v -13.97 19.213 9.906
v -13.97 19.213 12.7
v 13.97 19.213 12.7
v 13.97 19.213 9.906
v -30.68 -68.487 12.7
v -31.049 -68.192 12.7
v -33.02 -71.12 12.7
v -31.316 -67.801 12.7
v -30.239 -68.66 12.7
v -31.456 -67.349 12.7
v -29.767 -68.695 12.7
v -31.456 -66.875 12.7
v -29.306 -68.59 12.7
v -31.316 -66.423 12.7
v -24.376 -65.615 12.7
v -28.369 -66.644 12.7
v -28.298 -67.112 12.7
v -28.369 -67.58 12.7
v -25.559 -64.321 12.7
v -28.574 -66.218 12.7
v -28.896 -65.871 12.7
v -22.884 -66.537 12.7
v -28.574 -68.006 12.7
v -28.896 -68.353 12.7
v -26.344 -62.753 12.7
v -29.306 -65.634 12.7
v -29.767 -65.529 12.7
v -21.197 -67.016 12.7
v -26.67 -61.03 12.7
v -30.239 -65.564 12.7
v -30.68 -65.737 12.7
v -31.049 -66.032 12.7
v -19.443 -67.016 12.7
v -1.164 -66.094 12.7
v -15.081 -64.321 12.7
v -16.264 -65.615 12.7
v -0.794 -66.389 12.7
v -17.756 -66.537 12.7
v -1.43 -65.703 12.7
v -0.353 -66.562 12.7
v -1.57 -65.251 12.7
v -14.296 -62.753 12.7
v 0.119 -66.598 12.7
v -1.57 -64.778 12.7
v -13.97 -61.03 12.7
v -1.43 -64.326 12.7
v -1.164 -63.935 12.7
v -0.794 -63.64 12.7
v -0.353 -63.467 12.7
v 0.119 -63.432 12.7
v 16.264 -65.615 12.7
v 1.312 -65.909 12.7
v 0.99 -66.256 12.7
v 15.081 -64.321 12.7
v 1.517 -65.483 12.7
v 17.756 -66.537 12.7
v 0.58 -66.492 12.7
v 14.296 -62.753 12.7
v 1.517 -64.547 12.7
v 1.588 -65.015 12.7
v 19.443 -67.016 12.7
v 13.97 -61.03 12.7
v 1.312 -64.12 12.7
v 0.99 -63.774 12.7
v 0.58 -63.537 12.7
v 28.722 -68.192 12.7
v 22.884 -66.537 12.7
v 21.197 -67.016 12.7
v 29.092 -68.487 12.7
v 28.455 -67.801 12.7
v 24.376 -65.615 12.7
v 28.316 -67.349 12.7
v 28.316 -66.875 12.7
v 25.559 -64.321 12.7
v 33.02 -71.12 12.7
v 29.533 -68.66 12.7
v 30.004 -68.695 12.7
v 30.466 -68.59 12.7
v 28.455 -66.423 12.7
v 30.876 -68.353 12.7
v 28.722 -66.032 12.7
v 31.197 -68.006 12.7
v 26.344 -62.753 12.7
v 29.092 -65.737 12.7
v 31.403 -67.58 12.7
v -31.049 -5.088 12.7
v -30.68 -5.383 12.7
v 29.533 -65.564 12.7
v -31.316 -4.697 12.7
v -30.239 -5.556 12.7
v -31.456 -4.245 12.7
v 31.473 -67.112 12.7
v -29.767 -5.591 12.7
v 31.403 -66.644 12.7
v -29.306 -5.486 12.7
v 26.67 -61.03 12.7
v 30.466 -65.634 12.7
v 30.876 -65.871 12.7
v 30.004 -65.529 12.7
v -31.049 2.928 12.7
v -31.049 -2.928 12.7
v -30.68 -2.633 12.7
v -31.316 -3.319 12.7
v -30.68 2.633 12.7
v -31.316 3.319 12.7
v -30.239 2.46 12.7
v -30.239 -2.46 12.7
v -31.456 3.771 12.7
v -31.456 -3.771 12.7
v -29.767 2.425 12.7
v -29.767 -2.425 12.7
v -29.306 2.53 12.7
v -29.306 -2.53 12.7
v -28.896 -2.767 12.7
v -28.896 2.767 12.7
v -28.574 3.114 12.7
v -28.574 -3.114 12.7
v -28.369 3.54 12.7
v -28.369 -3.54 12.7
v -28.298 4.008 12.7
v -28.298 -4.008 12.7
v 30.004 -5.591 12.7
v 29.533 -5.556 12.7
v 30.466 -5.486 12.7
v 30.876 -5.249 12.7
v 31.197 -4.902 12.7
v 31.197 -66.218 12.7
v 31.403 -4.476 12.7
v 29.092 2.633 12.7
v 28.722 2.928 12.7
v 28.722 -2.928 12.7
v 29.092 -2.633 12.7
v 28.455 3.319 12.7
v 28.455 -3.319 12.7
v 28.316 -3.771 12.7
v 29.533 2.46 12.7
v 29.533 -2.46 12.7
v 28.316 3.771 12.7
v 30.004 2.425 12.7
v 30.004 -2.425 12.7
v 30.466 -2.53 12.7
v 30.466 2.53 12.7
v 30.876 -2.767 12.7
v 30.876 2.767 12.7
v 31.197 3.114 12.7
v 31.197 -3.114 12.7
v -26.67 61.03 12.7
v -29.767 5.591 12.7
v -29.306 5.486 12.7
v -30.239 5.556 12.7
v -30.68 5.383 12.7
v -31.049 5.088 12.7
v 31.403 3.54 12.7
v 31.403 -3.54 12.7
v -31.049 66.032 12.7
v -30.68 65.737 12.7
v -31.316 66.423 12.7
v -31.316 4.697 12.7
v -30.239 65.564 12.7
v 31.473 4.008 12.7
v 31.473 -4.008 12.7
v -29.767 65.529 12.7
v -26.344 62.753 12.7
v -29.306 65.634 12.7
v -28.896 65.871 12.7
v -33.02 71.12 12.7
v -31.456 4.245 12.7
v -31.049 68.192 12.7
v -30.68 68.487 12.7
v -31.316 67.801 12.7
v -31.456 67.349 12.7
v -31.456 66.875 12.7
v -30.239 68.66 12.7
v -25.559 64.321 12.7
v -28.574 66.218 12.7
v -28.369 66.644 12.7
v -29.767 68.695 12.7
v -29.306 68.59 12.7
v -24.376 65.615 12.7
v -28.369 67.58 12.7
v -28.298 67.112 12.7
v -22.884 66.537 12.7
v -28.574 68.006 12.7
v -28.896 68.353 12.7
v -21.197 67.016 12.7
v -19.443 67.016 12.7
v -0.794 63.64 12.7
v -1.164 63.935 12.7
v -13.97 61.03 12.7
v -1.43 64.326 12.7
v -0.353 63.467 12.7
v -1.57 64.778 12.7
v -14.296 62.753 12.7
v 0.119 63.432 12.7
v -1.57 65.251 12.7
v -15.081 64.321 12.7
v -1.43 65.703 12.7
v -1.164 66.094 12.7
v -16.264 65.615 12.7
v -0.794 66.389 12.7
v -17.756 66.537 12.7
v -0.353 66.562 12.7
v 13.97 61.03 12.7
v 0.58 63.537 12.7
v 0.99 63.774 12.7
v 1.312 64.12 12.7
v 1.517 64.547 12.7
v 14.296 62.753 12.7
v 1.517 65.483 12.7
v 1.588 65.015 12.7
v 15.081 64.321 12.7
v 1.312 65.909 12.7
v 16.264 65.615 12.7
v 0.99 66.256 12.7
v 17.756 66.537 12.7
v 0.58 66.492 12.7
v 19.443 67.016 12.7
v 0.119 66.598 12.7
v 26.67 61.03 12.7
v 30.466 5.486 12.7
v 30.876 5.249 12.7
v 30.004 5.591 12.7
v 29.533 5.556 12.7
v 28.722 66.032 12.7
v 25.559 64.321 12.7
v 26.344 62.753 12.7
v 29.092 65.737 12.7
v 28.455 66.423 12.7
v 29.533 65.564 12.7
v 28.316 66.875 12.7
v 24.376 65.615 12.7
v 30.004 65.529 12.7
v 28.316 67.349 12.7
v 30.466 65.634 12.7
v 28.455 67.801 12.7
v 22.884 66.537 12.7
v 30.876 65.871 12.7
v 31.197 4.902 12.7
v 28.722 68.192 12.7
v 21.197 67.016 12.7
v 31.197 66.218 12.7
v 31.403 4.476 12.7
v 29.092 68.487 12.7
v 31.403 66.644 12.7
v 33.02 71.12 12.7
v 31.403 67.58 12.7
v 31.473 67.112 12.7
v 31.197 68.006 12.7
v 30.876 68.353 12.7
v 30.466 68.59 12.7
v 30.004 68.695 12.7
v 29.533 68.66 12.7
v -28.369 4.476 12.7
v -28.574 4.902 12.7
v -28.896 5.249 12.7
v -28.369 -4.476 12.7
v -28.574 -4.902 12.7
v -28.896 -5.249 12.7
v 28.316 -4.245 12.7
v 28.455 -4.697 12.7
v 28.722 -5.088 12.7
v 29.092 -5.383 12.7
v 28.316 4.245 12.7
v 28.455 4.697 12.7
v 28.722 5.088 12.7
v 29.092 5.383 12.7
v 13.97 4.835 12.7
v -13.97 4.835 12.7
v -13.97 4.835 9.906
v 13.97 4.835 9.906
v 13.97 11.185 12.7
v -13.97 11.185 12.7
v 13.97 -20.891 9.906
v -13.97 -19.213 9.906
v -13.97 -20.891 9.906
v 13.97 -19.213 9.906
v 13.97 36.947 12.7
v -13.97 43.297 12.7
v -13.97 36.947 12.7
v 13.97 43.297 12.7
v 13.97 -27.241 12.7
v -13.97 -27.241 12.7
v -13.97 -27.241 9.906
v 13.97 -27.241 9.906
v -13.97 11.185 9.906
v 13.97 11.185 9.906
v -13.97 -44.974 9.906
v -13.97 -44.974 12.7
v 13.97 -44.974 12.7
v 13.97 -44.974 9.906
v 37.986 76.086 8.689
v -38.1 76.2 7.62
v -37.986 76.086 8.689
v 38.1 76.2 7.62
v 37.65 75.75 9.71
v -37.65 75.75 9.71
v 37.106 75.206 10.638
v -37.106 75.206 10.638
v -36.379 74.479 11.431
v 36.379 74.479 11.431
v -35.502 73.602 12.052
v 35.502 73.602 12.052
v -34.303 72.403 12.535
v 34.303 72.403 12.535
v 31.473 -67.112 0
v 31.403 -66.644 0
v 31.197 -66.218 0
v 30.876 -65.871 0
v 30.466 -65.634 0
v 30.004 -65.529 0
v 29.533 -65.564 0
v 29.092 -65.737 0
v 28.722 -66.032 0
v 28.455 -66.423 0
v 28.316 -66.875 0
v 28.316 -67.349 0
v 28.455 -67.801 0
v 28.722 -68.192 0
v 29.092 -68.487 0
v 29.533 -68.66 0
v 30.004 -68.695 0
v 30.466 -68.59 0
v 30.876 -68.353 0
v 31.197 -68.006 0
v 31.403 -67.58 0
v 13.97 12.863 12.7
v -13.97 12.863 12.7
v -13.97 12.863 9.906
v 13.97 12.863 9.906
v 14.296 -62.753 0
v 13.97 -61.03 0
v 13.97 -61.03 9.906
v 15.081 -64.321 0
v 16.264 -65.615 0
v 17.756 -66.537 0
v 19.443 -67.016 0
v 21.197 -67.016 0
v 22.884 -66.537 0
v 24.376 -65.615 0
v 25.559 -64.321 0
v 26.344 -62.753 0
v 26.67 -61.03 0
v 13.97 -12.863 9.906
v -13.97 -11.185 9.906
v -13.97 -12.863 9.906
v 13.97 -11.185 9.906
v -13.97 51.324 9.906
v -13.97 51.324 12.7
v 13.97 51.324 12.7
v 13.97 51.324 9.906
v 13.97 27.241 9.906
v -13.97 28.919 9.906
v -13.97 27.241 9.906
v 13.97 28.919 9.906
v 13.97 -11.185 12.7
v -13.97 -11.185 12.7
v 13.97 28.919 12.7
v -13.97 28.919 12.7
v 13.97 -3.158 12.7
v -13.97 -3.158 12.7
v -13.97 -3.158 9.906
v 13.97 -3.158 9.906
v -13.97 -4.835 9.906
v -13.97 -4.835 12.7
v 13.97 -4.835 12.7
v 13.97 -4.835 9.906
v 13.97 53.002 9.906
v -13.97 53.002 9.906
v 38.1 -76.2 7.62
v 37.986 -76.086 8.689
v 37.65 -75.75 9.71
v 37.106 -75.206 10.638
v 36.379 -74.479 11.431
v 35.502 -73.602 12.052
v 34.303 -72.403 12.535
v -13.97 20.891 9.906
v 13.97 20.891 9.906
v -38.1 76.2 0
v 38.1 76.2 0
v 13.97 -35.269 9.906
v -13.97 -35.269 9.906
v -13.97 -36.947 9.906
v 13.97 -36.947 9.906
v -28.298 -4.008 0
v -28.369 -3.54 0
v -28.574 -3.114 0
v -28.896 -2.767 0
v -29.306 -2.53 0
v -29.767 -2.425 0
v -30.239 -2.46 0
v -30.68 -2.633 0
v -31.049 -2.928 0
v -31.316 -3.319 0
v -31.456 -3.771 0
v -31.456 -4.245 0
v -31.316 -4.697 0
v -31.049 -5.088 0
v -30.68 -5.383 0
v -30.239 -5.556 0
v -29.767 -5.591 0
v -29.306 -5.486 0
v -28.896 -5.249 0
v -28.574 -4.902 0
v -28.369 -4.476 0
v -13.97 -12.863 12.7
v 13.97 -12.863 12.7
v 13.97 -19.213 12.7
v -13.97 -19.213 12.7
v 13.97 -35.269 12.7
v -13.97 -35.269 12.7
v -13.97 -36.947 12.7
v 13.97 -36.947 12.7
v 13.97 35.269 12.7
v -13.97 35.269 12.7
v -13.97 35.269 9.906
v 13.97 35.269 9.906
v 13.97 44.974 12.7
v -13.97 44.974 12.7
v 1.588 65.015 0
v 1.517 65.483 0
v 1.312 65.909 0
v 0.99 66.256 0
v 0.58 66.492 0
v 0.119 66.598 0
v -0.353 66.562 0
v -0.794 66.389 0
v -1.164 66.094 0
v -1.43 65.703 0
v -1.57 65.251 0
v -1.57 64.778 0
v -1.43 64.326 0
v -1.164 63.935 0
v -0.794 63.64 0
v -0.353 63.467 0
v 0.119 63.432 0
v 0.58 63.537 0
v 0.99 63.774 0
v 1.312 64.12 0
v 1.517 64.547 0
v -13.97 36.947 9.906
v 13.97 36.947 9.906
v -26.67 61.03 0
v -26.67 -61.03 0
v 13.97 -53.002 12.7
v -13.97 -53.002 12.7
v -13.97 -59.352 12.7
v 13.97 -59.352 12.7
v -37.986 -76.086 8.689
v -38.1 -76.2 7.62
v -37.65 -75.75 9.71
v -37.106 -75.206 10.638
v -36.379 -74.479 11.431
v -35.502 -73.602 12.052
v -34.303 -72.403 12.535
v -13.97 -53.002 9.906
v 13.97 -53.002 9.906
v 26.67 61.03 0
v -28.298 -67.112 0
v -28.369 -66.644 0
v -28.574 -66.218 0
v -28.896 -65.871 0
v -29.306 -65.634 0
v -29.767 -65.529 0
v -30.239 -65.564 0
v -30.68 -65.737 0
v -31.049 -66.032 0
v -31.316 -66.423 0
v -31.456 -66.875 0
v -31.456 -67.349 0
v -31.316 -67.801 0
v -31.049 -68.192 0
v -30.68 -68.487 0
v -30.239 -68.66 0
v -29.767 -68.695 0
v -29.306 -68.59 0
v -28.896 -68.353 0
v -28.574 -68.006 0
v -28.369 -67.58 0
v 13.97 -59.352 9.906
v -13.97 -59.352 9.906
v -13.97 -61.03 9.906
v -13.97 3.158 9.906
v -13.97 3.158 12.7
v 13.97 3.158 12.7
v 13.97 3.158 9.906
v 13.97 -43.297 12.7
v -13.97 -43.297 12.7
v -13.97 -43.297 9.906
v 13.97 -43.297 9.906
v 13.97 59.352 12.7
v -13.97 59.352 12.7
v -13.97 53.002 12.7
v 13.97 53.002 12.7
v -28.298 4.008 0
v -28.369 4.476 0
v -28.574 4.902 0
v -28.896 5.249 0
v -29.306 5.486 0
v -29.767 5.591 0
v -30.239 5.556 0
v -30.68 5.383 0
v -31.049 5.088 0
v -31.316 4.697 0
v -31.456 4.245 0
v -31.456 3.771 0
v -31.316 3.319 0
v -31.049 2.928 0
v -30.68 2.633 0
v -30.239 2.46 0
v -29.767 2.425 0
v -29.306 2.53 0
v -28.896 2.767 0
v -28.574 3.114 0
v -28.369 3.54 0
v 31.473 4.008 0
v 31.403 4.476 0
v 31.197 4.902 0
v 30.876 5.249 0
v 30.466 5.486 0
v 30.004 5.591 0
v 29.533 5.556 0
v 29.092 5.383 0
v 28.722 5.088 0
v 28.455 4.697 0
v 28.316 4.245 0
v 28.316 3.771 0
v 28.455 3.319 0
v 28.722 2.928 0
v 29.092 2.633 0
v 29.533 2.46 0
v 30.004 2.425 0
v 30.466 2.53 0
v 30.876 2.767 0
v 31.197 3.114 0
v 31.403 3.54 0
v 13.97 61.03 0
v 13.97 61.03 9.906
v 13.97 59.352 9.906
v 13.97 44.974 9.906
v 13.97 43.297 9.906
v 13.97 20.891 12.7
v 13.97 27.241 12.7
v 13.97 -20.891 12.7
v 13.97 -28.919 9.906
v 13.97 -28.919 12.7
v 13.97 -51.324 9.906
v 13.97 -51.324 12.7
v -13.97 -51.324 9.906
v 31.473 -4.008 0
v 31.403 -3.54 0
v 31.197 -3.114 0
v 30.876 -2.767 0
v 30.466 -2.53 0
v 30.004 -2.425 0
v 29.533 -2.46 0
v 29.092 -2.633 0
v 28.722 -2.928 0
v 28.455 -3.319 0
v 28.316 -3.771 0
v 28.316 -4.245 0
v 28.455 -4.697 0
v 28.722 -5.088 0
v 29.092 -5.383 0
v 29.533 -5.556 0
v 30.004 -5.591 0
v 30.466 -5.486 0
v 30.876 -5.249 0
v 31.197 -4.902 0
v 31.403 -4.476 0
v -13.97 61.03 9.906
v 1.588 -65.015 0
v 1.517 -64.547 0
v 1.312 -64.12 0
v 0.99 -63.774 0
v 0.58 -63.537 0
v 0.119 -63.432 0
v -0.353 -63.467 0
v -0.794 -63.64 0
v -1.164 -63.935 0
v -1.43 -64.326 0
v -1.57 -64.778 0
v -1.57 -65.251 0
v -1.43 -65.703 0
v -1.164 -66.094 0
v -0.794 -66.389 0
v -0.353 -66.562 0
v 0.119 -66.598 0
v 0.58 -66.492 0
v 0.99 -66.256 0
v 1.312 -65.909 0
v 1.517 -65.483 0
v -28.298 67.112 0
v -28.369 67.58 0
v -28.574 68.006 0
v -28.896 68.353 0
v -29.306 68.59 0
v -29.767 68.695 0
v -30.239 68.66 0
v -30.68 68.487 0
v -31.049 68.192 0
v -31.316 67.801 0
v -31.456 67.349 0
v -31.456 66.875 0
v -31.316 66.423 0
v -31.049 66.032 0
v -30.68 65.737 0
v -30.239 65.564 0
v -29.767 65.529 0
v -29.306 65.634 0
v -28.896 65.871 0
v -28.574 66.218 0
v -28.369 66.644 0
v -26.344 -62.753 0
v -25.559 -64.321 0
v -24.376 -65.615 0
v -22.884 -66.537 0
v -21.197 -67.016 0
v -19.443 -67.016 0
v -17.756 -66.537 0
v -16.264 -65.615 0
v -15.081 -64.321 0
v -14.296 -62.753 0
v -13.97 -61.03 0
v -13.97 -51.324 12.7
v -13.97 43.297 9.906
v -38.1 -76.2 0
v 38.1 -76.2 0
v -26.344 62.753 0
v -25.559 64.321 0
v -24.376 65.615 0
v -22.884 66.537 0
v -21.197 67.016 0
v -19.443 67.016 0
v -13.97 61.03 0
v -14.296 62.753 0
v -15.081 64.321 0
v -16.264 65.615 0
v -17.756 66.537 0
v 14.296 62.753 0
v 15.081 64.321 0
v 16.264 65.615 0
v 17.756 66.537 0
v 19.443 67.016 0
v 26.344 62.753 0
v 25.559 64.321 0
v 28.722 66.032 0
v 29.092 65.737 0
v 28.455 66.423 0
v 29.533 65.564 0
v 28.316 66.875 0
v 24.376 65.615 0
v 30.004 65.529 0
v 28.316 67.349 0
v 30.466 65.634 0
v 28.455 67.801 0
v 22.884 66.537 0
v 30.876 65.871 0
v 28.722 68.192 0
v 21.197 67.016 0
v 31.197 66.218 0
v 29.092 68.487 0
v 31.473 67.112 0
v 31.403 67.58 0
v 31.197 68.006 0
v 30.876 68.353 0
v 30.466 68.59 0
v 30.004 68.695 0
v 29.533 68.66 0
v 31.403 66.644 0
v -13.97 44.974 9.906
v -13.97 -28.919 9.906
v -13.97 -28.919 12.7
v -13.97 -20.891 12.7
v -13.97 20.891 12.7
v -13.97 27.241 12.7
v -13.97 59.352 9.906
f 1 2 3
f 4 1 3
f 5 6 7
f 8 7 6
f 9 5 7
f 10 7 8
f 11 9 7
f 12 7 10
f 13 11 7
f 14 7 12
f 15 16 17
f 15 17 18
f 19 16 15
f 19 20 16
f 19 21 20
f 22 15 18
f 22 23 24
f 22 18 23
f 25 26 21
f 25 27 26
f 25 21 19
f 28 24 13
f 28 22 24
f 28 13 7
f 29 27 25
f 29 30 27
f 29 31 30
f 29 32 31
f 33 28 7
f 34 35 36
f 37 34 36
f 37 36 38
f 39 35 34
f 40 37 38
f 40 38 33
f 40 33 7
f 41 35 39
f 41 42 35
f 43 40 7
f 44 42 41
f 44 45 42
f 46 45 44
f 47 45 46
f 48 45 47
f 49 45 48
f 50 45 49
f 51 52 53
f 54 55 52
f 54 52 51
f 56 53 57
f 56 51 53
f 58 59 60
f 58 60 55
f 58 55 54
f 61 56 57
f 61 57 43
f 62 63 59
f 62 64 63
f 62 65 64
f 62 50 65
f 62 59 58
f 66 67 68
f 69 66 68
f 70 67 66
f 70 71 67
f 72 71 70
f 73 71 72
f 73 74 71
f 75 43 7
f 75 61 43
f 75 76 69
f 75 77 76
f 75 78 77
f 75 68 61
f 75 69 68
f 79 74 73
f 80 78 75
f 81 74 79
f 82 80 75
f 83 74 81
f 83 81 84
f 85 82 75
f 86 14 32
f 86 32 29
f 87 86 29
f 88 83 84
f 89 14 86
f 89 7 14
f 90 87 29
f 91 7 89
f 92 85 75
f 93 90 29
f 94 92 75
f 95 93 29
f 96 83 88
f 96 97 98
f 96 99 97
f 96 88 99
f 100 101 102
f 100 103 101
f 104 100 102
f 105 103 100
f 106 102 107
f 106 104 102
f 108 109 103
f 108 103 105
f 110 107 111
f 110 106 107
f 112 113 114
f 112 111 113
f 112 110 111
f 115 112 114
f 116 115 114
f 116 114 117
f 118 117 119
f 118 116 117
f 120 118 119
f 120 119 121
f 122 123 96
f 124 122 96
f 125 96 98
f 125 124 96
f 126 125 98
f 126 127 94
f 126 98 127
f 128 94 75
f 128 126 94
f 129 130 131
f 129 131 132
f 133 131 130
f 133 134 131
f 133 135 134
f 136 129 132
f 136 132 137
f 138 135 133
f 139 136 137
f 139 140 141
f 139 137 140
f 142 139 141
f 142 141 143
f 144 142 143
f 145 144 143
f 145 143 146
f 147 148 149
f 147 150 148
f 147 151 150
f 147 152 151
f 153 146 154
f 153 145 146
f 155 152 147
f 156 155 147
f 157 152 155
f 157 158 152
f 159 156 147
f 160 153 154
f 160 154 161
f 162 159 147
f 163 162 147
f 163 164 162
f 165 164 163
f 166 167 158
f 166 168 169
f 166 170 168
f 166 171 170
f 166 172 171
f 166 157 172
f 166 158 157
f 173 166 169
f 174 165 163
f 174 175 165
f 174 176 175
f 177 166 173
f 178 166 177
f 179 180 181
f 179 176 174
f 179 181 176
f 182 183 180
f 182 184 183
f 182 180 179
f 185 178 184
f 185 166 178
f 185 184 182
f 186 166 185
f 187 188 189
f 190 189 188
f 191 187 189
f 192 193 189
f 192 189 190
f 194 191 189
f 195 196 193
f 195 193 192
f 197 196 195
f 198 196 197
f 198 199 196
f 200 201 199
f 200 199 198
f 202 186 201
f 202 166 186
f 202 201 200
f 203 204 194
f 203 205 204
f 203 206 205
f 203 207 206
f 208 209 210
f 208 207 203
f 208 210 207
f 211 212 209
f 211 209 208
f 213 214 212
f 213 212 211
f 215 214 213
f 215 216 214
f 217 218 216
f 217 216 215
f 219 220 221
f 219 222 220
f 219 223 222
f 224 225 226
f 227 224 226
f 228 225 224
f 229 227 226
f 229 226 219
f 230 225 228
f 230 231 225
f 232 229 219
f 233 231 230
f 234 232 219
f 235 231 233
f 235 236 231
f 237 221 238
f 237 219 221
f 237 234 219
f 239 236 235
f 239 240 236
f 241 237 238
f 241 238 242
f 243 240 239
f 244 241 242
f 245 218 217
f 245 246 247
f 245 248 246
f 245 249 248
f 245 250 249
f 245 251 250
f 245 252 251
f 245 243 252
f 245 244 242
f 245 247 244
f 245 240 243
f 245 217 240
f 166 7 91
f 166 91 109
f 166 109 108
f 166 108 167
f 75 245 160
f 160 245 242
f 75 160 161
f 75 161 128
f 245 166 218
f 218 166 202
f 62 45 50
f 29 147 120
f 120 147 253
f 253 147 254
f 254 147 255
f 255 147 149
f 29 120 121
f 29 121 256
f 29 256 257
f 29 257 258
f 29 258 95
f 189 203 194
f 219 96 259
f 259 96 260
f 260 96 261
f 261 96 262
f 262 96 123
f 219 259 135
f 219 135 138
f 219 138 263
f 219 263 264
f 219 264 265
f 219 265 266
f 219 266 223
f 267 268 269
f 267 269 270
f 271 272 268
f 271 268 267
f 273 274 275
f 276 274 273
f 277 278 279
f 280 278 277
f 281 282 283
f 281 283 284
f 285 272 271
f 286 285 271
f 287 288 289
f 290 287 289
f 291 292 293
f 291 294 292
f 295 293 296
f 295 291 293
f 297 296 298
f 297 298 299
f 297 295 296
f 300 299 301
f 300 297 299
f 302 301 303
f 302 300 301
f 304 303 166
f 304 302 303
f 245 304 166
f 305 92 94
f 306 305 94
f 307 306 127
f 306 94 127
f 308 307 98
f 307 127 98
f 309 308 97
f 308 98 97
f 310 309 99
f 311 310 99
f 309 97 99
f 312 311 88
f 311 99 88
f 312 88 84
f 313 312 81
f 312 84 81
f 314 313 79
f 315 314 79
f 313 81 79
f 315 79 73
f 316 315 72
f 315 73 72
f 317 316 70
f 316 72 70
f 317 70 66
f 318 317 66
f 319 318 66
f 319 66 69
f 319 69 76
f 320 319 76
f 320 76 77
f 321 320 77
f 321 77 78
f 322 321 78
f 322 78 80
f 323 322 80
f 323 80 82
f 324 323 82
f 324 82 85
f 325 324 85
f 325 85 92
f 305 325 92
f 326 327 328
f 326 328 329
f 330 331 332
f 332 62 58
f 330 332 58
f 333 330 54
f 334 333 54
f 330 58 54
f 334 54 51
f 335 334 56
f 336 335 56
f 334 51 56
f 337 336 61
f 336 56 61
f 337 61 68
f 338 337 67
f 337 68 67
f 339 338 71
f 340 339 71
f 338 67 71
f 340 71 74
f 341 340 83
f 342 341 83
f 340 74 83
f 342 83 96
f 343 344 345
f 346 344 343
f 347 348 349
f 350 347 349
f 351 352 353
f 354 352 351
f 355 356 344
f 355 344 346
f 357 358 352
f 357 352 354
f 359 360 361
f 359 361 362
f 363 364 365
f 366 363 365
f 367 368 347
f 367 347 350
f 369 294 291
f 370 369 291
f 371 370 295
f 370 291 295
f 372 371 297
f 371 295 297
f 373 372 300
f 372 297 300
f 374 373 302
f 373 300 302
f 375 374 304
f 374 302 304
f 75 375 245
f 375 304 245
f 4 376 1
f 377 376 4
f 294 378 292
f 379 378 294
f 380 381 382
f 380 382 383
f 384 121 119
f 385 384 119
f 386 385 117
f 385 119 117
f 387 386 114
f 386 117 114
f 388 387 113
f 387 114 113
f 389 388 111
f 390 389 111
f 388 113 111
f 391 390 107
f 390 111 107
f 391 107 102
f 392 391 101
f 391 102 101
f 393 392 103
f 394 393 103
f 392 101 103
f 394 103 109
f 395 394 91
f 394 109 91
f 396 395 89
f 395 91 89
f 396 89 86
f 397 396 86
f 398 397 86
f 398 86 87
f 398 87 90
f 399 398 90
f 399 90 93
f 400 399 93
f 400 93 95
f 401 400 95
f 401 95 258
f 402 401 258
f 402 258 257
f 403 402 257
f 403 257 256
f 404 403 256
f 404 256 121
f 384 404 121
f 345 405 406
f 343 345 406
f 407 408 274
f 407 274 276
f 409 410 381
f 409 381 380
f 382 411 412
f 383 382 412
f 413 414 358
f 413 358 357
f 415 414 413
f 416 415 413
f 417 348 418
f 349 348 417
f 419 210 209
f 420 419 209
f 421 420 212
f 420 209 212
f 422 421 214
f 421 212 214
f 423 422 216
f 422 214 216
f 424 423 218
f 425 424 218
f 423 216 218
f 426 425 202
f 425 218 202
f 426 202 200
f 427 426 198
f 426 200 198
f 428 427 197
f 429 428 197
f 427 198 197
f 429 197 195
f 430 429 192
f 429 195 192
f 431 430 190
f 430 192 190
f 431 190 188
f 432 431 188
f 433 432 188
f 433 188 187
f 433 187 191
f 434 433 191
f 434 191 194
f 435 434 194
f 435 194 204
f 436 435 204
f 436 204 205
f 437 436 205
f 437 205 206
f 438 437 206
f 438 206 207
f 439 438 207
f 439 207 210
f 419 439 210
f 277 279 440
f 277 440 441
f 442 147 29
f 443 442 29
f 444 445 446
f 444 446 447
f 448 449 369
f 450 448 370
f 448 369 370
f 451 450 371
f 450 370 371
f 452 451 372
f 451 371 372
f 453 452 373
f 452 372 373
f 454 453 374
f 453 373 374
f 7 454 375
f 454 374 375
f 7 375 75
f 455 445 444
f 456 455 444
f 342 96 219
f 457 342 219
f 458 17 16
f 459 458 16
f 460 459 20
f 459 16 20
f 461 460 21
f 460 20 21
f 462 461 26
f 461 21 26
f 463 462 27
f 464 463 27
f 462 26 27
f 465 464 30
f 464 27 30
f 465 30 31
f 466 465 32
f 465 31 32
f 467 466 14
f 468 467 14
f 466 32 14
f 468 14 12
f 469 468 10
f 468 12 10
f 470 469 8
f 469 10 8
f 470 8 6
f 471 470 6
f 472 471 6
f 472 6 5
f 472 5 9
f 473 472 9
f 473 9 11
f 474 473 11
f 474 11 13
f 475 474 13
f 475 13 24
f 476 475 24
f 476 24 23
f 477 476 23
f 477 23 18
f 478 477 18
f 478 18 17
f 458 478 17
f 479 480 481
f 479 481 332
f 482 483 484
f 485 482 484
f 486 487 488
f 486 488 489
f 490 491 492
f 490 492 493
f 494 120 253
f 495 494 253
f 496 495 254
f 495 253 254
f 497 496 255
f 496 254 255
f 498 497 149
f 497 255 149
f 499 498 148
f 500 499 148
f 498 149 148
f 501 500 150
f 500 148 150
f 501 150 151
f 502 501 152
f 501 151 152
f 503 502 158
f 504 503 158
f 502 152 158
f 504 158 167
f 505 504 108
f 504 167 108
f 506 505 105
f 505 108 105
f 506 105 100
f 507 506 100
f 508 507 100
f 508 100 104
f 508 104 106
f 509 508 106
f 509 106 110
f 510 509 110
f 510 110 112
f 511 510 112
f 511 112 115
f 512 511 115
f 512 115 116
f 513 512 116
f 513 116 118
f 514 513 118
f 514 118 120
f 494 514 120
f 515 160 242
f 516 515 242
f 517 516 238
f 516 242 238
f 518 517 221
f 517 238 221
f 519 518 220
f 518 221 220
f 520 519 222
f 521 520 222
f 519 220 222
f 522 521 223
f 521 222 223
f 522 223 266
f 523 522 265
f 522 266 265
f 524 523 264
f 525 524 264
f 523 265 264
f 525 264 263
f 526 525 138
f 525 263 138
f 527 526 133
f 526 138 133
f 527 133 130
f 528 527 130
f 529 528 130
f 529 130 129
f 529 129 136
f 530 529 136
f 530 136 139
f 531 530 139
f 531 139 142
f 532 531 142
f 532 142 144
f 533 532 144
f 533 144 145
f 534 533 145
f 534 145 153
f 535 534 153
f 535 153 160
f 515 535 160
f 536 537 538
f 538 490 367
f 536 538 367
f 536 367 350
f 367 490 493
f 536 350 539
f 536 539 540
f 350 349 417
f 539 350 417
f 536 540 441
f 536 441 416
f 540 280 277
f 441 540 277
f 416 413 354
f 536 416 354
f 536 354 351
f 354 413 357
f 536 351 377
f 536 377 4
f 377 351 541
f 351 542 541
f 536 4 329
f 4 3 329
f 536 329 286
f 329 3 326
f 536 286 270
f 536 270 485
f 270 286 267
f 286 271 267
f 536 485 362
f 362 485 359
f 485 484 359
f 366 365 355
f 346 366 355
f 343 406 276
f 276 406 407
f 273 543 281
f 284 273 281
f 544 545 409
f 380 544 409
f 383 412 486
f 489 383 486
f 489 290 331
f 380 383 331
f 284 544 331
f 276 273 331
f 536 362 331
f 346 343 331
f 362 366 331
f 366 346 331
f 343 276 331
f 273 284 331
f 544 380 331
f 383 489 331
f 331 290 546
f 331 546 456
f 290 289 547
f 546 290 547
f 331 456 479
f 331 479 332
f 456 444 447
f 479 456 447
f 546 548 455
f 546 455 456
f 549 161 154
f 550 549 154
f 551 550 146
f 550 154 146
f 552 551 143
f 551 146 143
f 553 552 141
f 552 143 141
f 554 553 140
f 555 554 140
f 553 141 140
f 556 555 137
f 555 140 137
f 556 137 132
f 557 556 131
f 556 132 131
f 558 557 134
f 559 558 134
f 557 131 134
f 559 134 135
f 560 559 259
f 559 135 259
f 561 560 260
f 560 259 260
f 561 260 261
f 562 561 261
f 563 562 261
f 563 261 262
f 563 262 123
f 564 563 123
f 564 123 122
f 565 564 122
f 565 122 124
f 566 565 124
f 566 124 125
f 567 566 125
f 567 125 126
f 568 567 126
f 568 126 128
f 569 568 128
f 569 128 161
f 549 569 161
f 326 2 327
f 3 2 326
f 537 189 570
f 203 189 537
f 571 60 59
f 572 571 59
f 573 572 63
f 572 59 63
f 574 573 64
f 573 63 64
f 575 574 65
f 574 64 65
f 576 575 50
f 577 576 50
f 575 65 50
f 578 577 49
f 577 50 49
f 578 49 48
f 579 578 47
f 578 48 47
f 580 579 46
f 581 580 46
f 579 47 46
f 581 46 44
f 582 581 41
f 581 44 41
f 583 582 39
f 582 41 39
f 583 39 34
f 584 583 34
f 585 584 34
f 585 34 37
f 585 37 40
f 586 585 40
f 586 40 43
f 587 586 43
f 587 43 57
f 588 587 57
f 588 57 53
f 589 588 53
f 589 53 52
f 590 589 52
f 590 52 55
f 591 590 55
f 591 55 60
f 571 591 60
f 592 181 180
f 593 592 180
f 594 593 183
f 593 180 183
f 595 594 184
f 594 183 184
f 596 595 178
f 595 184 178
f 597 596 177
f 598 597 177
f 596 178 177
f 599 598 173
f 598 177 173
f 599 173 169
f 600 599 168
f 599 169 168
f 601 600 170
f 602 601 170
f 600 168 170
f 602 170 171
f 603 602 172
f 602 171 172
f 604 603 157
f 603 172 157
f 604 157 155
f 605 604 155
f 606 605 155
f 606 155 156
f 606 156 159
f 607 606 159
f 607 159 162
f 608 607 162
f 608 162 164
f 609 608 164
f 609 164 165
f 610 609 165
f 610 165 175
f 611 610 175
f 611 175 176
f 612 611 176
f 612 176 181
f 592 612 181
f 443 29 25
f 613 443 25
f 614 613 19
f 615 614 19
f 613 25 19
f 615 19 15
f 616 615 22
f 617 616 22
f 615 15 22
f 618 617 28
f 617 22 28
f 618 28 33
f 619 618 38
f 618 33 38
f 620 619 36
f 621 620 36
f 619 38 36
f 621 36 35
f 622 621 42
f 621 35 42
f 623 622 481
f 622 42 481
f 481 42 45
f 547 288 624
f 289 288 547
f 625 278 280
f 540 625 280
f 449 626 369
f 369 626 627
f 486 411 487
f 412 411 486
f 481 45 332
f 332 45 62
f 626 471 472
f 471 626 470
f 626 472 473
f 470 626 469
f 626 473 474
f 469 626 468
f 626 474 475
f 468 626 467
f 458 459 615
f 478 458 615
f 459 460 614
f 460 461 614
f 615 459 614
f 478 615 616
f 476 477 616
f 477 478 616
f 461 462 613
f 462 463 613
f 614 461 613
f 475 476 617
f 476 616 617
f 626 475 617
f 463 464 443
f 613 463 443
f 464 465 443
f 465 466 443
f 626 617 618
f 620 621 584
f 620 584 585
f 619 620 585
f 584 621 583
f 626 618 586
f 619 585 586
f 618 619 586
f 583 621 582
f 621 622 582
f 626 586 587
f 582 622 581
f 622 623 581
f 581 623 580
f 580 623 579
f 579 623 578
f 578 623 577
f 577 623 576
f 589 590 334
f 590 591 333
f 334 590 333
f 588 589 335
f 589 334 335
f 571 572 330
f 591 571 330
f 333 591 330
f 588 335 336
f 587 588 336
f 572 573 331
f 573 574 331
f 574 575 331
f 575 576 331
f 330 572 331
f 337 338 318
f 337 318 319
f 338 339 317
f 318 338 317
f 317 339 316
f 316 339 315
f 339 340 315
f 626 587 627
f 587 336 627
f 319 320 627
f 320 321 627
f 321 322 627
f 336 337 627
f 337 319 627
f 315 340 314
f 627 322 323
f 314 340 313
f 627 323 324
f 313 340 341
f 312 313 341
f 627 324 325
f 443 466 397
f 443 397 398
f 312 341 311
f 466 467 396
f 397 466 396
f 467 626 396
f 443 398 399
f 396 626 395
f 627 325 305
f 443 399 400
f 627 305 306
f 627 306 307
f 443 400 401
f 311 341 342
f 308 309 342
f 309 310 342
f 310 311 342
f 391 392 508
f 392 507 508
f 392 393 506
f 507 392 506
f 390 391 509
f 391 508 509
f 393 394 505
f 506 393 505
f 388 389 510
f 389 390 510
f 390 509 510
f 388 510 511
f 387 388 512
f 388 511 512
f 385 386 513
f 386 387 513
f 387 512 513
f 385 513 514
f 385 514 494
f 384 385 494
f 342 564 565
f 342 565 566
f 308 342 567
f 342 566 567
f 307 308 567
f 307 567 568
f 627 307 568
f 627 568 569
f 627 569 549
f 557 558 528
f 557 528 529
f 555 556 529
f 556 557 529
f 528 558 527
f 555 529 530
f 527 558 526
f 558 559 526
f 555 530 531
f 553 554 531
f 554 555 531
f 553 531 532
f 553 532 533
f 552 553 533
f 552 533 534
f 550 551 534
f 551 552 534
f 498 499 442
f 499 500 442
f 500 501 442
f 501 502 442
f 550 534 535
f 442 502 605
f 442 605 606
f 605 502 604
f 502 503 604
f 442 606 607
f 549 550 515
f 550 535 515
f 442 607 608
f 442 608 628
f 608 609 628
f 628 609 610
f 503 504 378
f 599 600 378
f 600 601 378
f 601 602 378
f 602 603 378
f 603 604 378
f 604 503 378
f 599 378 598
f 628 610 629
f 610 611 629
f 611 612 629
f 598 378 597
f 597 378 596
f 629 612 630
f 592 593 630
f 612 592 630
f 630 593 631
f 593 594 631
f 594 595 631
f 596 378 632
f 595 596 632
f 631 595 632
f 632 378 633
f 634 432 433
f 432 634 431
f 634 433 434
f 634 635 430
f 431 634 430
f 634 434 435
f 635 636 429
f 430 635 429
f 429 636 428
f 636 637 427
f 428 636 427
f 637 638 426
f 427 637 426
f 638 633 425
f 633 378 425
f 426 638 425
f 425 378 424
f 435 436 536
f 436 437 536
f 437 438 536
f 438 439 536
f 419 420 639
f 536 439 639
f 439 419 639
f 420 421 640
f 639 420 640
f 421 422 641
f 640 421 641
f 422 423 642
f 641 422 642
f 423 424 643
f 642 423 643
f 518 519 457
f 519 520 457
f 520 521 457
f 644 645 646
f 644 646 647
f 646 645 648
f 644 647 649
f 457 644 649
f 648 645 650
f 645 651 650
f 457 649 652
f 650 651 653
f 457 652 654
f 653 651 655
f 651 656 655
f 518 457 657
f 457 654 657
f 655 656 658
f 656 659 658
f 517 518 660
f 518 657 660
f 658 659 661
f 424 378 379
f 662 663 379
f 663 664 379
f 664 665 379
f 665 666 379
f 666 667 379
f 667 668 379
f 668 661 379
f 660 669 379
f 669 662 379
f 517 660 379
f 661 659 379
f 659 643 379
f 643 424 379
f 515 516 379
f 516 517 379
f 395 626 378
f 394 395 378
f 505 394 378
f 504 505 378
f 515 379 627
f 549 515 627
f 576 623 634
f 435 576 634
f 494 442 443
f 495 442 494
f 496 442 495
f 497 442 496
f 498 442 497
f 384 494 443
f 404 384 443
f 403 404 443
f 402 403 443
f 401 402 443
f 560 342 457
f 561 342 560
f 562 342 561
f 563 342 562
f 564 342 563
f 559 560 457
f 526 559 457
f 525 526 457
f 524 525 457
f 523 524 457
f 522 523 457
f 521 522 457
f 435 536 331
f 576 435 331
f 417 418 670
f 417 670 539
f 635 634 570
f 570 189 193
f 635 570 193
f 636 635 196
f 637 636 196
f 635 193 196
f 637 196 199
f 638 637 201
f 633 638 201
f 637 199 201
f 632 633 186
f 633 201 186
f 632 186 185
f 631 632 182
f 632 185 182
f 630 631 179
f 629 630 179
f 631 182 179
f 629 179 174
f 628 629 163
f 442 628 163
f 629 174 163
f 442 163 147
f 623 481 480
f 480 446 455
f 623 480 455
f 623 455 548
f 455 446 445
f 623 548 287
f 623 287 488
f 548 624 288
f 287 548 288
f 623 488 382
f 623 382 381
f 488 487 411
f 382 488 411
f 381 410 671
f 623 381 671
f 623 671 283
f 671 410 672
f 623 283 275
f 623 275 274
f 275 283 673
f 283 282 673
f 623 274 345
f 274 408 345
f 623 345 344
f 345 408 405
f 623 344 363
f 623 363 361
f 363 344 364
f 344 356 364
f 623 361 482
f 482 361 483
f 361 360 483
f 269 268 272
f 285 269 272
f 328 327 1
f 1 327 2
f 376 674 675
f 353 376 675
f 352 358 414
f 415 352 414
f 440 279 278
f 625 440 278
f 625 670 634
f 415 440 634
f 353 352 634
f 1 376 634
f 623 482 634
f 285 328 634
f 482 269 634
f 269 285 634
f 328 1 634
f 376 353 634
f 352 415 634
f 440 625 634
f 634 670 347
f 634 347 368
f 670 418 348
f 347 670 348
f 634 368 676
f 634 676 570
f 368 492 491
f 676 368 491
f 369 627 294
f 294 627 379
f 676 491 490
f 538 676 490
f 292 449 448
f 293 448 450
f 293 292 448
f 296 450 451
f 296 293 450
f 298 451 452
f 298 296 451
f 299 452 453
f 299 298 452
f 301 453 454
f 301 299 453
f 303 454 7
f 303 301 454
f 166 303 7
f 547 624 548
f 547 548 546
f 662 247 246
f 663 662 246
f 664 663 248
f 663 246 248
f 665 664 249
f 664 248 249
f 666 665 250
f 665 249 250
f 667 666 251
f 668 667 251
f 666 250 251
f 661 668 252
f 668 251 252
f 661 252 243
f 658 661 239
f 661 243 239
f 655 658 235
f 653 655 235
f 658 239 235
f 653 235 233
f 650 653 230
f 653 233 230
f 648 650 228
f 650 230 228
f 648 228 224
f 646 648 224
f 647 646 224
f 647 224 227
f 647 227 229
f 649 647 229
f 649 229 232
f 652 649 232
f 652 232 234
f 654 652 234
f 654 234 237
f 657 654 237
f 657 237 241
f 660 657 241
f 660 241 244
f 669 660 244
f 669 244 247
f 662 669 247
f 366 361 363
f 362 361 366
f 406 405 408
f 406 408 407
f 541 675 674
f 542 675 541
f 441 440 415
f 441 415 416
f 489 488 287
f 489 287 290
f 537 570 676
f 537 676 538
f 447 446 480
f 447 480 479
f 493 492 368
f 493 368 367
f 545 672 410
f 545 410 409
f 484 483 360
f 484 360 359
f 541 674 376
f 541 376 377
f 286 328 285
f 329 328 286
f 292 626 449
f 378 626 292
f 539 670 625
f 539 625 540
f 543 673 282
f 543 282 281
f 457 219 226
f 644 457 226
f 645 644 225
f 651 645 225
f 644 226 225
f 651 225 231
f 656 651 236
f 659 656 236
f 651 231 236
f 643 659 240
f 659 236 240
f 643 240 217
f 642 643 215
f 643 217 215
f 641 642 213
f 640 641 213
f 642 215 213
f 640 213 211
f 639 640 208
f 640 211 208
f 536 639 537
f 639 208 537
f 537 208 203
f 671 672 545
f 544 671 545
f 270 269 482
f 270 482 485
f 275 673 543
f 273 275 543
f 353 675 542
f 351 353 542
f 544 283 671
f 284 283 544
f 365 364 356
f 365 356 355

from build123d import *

# Parameters (mm, degrees)
F0_W     = 76.2
F0_H     = 152.4
F1_DEPTH = 12.7
F2_R     = 5.08
F4_DEPTH = 25.4
F5_R     = 1.5875
F6_DEPTH = 25.4
F7_W     = 27.94
F7_H     = 1.6778
F8_DEPTH = 2.794


with BuildPart() as f1:
    # F0 (on Top) → F1 (new body)
    with BuildSketch(Plane.XY):
        Rectangle(F0_W, F0_H)
    extrude(amount=F1_DEPTH)

    # F2
    f2_edges = [f1.edges().sort_by_distance(p)[0] for p in [
        (-38.1, 0, 12.7),
        (0, 76.2, 12.7),
        (38.1, 0, 12.7),
        (0, -76.2, 12.7),
    ]]
    fillet(f2_edges, radius=F2_R)

    # F3 (on face) → F4 (cut)
    with BuildSketch(Plane.XY.offset(12.7)):
        with BuildLine():
            Line((-13.97, -61.029911), (-13.97, 61.029911))
            ThreePointArc((-13.97, 61.029911), (-20.32, 67.076798), (-26.67, 61.029911))
            Line((-26.67, 61.029911), (-26.67, -61.029911))
            ThreePointArc((-26.67, -61.029911), (-20.32, -67.076798), (-13.97, -61.029911))
        make_face()
        with BuildLine():
            ThreePointArc((26.67, 61.029911), (20.32, 67.076798), (13.97, 61.029911))
            Line((13.97, 61.029911), (13.97, -61.029911))
            ThreePointArc((13.97, -61.029911), (20.32, -67.076798), (26.67, -61.029911))
            Line((26.67, -61.029911), (26.67, 61.029911))
        make_face()
    extrude(amount=-F4_DEPTH, mode=Mode.SUBTRACT)

    # F5 (on face) → F6 (cut)
    with BuildSketch(Plane.XY.offset(12.7)):
        with Locations((0, 65.014675)):
            Circle(F5_R)
        with Locations((0, -65.014675)):
            Circle(F5_R)
        with Locations((-29.88578, 67.111924)):
            Circle(F5_R)
        with Locations((29.88578, 67.111924)):
            Circle(F5_R)
        with Locations((29.88578, -67.111924)):
            Circle(F5_R)
        with Locations((-29.88578, -67.111924)):
            Circle(F5_R)
        with Locations((-29.88578, 4.008076)):
            Circle(F5_R)
        with Locations((29.88578, 4.008076)):
            Circle(F5_R)
        with Locations((-29.88578, -4.008076)):
            Circle(F5_R)
        with Locations((29.88578, -4.008076)):
            Circle(F5_R)
    extrude(amount=-F6_DEPTH, mode=Mode.SUBTRACT)

    # F7 (on face) → F8 (cut)
    with BuildSketch(Plane.XY.offset(12.7)):
        with Locations((0, 60.191011)):
            Rectangle(F7_W, F7_H)
        with Locations((0, 52.163211)):
            Rectangle(F7_W, F7_H)
        with Locations((0, 44.135411)):
            Rectangle(F7_W, F7_H)
        with Locations((0, 36.107611)):
            Rectangle(F7_W, F7_H)
        with Locations((0, 28.079811)):
            Rectangle(F7_W, F7_H)
        with Locations((0, 20.052011)):
            Rectangle(F7_W, F7_H)
        with Locations((0, 12.024211)):
            Rectangle(F7_W, F7_H)
        with Locations((0, 3.996411)):
            Rectangle(F7_W, F7_H)
        with Locations((0, -3.996411)):
            Rectangle(F7_W, F7_H)
        with Locations((0, -12.024211)):
            Rectangle(F7_W, F7_H)
        with Locations((0, -20.052011)):
            Rectangle(F7_W, F7_H)
        with Locations((0, -28.079811)):
            Rectangle(F7_W, F7_H)
        with Locations((0, -36.107611)):
            Rectangle(F7_W, F7_H)
        with Locations((0, -44.135411)):
            Rectangle(F7_W, F7_H)
        with Locations((0, -52.163211)):
            Rectangle(F7_W, F7_H)
        with Locations((0, -60.191011)):
            Rectangle(F7_W, F7_H)
    extrude(amount=-F8_DEPTH, mode=Mode.SUBTRACT)


solid = f1.part
